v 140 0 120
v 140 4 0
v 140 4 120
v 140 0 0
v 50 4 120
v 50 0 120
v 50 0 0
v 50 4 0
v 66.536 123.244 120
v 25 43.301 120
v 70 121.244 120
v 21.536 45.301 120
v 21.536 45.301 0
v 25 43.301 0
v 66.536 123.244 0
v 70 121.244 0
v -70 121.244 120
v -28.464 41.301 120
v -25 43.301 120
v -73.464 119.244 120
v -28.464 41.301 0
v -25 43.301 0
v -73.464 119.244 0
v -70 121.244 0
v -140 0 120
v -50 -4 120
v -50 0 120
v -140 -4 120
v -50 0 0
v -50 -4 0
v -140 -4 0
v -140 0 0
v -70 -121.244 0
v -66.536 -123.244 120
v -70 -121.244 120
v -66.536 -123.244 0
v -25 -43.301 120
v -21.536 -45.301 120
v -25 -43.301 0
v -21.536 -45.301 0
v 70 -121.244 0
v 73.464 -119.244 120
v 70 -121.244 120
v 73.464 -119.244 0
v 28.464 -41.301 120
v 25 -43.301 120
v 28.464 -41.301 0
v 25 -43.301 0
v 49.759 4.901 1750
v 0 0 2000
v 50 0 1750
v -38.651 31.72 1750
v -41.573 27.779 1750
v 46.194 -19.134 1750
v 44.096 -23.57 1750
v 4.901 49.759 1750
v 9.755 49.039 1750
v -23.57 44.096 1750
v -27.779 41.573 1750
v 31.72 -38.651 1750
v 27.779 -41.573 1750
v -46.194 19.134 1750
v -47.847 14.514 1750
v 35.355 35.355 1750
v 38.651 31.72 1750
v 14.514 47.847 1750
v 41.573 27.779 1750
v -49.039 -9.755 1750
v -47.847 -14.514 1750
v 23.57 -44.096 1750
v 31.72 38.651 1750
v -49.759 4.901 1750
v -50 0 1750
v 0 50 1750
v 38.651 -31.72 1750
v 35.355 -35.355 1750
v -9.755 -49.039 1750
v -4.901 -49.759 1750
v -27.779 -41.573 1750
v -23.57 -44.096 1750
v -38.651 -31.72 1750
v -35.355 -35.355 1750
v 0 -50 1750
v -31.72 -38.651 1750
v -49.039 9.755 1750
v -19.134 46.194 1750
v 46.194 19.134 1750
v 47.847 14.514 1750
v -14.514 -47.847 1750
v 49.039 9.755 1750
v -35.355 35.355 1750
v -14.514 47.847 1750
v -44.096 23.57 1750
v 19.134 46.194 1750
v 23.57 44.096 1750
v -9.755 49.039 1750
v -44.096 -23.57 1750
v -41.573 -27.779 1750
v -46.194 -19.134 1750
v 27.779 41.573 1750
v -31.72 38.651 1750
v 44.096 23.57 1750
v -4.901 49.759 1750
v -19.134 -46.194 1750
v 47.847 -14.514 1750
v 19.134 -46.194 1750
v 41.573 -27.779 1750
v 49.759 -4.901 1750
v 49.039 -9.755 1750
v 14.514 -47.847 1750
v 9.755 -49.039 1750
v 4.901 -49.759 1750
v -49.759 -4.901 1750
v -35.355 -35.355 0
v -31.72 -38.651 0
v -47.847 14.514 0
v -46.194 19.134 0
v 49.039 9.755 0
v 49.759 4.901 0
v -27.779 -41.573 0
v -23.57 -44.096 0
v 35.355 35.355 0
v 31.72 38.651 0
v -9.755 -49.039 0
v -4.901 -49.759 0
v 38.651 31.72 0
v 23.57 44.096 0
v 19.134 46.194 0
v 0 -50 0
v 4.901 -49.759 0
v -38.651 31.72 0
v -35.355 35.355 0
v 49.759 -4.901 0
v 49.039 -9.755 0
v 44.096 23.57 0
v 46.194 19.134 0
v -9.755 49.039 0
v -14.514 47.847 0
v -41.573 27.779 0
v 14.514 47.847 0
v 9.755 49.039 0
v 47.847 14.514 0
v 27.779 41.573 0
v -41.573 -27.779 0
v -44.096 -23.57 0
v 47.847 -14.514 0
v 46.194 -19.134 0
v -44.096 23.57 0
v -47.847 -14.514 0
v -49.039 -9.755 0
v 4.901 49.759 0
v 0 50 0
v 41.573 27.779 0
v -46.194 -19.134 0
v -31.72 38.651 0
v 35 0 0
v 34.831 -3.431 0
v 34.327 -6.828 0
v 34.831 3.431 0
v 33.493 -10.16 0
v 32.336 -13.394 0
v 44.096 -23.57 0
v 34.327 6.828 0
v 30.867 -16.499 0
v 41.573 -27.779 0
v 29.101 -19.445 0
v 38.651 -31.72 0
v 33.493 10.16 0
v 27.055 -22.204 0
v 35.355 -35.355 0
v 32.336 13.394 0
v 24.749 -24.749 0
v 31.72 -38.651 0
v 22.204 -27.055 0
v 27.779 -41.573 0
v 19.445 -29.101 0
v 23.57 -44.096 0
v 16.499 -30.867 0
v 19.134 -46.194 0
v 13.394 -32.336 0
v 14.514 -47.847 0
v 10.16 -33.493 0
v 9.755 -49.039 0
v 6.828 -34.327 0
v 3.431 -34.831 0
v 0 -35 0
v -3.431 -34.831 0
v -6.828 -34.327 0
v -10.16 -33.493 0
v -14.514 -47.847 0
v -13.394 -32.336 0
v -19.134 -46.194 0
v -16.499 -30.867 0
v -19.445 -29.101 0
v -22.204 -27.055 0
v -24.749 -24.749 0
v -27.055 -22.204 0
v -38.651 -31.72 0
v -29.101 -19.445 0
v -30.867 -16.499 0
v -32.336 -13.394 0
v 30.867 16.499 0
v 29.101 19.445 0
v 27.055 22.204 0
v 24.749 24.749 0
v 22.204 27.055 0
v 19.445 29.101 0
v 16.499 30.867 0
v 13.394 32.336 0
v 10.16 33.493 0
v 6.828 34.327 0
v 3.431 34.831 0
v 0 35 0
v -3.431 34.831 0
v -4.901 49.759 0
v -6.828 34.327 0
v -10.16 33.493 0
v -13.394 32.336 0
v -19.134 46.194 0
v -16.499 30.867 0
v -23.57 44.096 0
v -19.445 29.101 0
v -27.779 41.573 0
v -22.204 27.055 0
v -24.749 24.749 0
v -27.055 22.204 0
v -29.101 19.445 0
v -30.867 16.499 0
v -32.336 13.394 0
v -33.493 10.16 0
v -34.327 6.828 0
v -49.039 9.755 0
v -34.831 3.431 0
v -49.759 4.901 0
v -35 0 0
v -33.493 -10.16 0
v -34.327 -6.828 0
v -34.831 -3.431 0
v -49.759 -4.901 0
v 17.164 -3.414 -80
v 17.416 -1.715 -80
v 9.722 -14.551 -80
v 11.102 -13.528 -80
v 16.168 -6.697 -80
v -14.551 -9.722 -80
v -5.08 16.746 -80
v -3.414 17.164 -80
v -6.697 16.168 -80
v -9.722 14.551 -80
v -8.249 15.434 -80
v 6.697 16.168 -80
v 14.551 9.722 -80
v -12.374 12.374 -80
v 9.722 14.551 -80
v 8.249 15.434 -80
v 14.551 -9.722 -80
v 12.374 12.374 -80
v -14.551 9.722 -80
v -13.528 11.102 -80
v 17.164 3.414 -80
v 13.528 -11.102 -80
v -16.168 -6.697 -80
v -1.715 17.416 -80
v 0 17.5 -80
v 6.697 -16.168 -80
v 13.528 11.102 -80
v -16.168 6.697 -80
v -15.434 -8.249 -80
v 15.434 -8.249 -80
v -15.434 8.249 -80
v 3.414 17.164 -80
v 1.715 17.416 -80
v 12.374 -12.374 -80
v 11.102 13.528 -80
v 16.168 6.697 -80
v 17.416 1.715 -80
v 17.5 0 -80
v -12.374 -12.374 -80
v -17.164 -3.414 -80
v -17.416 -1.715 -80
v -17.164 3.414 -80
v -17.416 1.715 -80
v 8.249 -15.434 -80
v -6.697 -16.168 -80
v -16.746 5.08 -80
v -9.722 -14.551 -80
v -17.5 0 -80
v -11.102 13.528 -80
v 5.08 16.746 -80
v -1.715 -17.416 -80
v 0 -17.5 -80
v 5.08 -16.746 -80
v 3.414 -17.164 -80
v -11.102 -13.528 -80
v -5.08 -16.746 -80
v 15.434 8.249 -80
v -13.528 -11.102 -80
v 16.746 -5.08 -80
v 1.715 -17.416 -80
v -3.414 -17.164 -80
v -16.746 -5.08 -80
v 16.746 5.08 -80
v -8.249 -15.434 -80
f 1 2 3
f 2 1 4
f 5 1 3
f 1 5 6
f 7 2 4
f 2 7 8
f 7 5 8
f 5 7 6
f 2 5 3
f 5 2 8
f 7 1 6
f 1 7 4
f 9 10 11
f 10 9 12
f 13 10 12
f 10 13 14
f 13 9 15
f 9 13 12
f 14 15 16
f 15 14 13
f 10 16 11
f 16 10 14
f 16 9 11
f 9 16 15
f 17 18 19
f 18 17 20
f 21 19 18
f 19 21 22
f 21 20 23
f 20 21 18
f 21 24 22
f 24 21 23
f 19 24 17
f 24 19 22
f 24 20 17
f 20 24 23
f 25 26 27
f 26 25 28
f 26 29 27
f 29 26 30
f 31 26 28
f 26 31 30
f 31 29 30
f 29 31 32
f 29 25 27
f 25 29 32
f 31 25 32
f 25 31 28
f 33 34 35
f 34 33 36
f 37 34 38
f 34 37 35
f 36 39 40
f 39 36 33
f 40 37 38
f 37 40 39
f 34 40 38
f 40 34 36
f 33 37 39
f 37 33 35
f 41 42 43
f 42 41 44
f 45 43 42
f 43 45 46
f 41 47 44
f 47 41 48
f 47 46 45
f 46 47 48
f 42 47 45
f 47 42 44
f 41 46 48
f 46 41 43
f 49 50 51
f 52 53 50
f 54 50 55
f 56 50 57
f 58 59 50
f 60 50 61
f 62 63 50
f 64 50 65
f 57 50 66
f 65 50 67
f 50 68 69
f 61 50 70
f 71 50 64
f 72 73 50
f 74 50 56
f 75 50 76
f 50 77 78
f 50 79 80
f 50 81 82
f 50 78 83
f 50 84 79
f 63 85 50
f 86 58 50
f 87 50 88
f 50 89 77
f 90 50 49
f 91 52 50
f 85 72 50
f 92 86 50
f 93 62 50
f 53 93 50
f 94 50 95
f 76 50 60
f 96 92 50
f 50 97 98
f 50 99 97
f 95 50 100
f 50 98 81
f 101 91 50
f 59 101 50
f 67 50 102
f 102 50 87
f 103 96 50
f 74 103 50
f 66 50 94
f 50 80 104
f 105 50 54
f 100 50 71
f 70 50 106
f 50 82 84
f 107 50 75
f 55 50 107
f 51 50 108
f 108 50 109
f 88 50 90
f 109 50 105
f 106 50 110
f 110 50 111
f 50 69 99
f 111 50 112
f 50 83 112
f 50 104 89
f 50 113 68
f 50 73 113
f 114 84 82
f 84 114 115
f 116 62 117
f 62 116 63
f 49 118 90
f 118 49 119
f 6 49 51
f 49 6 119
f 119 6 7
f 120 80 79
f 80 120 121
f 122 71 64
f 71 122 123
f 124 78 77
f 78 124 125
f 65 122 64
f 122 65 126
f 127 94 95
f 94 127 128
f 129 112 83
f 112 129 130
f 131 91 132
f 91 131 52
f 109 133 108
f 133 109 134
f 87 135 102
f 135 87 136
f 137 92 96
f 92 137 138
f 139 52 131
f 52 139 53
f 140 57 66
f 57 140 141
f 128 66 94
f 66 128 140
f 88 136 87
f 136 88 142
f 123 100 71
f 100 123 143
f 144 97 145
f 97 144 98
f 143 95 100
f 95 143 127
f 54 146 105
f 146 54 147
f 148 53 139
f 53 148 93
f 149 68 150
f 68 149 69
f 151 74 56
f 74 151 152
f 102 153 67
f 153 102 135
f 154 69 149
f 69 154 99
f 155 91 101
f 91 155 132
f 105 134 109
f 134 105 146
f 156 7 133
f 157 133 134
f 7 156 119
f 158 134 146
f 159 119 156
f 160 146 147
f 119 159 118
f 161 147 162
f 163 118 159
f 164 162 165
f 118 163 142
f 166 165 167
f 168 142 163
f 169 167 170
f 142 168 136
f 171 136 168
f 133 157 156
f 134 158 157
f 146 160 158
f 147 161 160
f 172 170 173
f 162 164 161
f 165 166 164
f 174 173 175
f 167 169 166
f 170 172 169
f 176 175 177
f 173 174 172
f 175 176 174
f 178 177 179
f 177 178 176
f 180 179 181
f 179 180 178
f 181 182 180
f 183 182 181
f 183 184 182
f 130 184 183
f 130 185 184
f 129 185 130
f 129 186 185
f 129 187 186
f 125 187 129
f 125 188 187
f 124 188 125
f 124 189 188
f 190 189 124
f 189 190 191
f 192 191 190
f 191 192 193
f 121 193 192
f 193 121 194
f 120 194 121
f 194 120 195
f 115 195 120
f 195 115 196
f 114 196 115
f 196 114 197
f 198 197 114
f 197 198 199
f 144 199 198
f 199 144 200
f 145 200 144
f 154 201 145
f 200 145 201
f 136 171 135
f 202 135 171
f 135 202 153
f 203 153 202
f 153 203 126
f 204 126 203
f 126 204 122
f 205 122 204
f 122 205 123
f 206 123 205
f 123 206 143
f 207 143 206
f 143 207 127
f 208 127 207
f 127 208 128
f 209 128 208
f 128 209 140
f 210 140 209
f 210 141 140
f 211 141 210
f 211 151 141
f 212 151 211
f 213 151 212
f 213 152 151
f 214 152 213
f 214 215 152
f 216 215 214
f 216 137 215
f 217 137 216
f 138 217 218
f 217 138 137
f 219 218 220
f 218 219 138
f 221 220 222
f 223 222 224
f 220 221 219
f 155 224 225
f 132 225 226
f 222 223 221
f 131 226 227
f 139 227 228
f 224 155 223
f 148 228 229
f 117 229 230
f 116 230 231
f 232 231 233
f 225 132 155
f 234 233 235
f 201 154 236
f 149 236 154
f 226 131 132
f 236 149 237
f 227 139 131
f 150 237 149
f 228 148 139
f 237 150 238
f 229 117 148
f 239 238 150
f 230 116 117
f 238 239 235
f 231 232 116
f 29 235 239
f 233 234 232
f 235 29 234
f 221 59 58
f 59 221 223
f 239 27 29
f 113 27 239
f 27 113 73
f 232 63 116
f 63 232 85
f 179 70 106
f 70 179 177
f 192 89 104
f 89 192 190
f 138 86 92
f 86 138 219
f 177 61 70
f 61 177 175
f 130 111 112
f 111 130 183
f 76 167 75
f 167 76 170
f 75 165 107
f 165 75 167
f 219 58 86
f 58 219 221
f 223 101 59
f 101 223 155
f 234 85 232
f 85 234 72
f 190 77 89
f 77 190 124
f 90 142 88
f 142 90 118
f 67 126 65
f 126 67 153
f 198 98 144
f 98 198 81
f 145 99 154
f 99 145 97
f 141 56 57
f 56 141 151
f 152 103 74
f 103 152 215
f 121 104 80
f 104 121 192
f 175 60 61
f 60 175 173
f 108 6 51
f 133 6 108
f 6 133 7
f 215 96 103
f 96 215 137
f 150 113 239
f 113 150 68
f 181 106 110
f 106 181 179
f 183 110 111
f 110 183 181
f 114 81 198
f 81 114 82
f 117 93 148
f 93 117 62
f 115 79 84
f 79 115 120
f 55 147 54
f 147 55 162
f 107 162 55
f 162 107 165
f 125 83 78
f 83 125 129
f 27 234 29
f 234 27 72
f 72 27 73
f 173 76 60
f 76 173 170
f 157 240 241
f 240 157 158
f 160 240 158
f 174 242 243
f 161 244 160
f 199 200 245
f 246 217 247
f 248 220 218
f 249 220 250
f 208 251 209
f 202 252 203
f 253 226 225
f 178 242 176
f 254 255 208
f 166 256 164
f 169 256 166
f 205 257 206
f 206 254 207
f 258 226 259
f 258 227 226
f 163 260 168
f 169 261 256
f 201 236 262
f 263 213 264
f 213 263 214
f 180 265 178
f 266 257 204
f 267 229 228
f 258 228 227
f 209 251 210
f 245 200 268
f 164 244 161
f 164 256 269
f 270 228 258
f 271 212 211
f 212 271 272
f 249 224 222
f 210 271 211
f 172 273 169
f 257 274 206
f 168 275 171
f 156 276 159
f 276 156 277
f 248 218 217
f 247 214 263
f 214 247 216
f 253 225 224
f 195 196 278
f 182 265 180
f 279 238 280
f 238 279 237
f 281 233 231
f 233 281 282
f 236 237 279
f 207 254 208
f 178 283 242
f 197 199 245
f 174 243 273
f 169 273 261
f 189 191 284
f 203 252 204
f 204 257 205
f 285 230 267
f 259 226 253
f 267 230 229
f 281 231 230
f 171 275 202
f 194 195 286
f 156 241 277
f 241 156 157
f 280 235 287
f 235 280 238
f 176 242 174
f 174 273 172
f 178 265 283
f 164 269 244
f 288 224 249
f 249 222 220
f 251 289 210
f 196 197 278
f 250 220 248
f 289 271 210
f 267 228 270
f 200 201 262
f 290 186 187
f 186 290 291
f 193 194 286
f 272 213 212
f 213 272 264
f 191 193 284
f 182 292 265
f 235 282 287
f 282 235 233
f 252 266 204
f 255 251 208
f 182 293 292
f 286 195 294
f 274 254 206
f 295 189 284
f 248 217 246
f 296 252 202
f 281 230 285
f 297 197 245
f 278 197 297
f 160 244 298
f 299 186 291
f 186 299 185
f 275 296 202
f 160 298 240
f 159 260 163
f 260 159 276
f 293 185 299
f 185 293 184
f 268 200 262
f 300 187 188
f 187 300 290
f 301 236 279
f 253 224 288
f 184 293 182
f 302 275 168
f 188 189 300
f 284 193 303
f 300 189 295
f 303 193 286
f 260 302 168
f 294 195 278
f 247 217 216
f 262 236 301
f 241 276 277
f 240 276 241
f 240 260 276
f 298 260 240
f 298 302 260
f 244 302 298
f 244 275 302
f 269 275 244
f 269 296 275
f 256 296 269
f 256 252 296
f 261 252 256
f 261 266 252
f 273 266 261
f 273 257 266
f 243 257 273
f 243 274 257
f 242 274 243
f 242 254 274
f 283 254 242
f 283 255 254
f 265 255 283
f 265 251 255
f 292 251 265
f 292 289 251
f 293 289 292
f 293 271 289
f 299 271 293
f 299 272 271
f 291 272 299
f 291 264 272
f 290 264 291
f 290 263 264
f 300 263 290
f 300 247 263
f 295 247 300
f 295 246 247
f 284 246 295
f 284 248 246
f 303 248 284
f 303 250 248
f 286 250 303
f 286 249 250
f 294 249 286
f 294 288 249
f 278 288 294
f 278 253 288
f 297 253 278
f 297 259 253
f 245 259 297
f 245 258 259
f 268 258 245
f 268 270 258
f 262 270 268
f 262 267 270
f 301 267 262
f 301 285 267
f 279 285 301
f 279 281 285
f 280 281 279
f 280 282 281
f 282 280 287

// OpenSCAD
// Generated by Text-to-CAD from prompt:
// a 2 metre rocket with 6 fins and 2 stages
$fn = 64;

module Rocket() {
    translate([0, 0, 1750]) {
    cylinder(h=250, r1=50, r2=0, $fn=$fn);
    }
cylinder(h=875, r=50, $fn=$fn);
    translate([0, 0, 875]) {
    cylinder(h=875, r=50, $fn=$fn);
    }
for (i = [0 : 5]) rotate([0, 0, 360.0 / 6 * i]) {
    translate([50, 0, 0]) {
        cube([90, 4, 120]);
    }
}
    translate([0, 0, -80]) {
    cylinder(h=80, r1=17.5, r2=35, $fn=$fn);
    }
}

Rocket();
